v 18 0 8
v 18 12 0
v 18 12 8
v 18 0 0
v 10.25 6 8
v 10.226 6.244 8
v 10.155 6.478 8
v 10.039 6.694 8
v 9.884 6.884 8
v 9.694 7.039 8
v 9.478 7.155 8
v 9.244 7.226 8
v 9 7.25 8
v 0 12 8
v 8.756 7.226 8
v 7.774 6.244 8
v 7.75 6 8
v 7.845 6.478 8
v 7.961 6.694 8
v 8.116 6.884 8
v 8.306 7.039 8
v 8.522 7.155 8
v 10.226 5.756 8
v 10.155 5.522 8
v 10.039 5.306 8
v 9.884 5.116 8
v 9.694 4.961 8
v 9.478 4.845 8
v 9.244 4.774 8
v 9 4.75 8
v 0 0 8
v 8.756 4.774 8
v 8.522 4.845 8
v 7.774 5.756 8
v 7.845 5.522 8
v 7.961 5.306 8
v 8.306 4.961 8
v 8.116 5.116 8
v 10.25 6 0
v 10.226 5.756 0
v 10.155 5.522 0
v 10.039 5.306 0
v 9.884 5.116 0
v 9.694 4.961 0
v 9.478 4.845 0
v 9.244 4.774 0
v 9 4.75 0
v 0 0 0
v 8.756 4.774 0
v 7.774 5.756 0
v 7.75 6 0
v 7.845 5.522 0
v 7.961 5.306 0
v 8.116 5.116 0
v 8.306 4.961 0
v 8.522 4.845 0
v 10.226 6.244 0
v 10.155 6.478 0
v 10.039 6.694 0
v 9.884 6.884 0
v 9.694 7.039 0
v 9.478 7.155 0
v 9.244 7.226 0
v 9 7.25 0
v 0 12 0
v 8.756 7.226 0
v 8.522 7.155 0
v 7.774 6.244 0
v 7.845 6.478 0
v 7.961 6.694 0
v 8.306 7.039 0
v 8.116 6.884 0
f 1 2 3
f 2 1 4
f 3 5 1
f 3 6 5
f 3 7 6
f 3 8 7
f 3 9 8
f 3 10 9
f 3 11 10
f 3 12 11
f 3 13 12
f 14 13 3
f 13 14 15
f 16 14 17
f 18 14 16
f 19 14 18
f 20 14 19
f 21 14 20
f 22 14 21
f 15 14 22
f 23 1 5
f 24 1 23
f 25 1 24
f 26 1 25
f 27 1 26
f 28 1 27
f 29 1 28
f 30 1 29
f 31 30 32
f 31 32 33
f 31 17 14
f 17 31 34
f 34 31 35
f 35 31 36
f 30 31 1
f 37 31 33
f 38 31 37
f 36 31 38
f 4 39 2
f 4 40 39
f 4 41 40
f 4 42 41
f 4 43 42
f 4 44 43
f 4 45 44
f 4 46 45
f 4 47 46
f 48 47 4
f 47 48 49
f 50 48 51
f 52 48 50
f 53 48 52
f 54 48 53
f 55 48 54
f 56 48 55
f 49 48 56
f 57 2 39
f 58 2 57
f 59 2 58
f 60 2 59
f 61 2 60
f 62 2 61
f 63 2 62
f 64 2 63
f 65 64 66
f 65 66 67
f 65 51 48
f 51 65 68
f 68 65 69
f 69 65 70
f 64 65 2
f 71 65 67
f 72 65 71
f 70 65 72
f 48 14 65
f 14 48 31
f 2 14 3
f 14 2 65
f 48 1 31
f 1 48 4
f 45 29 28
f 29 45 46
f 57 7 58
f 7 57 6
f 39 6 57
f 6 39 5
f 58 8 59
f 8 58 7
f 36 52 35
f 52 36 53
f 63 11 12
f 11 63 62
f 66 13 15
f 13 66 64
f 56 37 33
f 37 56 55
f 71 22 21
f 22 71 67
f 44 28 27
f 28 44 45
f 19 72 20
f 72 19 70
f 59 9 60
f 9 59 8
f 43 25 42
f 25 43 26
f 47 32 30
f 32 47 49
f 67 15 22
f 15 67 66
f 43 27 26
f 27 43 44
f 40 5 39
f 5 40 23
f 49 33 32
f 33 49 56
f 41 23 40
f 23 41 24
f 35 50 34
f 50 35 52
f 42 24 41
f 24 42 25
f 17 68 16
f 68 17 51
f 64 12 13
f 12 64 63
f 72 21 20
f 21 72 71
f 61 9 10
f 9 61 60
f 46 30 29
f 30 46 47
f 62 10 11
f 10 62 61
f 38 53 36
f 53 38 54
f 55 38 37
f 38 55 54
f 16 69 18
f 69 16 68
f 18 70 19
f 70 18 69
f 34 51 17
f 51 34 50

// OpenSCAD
$fn = 32;

// ----------------------------------------------------------------------
// Micro pad: drilled pad, 5-20 mm class
// ----------------------------------------------------------------------

// --- parameters (mm) ---
pad_l = 18;               // pad length, X
pad_w = 12;               // pad width, Y
pad_t = 8;                // pad thickness, Z
hole_d = 2.5;             // through hole diameter

difference() {
  cube([pad_l, pad_w, pad_t]);
  translate([pad_l / 2, pad_w / 2, -1])
    cylinder(h = pad_t + 2, d = hole_d);
}
